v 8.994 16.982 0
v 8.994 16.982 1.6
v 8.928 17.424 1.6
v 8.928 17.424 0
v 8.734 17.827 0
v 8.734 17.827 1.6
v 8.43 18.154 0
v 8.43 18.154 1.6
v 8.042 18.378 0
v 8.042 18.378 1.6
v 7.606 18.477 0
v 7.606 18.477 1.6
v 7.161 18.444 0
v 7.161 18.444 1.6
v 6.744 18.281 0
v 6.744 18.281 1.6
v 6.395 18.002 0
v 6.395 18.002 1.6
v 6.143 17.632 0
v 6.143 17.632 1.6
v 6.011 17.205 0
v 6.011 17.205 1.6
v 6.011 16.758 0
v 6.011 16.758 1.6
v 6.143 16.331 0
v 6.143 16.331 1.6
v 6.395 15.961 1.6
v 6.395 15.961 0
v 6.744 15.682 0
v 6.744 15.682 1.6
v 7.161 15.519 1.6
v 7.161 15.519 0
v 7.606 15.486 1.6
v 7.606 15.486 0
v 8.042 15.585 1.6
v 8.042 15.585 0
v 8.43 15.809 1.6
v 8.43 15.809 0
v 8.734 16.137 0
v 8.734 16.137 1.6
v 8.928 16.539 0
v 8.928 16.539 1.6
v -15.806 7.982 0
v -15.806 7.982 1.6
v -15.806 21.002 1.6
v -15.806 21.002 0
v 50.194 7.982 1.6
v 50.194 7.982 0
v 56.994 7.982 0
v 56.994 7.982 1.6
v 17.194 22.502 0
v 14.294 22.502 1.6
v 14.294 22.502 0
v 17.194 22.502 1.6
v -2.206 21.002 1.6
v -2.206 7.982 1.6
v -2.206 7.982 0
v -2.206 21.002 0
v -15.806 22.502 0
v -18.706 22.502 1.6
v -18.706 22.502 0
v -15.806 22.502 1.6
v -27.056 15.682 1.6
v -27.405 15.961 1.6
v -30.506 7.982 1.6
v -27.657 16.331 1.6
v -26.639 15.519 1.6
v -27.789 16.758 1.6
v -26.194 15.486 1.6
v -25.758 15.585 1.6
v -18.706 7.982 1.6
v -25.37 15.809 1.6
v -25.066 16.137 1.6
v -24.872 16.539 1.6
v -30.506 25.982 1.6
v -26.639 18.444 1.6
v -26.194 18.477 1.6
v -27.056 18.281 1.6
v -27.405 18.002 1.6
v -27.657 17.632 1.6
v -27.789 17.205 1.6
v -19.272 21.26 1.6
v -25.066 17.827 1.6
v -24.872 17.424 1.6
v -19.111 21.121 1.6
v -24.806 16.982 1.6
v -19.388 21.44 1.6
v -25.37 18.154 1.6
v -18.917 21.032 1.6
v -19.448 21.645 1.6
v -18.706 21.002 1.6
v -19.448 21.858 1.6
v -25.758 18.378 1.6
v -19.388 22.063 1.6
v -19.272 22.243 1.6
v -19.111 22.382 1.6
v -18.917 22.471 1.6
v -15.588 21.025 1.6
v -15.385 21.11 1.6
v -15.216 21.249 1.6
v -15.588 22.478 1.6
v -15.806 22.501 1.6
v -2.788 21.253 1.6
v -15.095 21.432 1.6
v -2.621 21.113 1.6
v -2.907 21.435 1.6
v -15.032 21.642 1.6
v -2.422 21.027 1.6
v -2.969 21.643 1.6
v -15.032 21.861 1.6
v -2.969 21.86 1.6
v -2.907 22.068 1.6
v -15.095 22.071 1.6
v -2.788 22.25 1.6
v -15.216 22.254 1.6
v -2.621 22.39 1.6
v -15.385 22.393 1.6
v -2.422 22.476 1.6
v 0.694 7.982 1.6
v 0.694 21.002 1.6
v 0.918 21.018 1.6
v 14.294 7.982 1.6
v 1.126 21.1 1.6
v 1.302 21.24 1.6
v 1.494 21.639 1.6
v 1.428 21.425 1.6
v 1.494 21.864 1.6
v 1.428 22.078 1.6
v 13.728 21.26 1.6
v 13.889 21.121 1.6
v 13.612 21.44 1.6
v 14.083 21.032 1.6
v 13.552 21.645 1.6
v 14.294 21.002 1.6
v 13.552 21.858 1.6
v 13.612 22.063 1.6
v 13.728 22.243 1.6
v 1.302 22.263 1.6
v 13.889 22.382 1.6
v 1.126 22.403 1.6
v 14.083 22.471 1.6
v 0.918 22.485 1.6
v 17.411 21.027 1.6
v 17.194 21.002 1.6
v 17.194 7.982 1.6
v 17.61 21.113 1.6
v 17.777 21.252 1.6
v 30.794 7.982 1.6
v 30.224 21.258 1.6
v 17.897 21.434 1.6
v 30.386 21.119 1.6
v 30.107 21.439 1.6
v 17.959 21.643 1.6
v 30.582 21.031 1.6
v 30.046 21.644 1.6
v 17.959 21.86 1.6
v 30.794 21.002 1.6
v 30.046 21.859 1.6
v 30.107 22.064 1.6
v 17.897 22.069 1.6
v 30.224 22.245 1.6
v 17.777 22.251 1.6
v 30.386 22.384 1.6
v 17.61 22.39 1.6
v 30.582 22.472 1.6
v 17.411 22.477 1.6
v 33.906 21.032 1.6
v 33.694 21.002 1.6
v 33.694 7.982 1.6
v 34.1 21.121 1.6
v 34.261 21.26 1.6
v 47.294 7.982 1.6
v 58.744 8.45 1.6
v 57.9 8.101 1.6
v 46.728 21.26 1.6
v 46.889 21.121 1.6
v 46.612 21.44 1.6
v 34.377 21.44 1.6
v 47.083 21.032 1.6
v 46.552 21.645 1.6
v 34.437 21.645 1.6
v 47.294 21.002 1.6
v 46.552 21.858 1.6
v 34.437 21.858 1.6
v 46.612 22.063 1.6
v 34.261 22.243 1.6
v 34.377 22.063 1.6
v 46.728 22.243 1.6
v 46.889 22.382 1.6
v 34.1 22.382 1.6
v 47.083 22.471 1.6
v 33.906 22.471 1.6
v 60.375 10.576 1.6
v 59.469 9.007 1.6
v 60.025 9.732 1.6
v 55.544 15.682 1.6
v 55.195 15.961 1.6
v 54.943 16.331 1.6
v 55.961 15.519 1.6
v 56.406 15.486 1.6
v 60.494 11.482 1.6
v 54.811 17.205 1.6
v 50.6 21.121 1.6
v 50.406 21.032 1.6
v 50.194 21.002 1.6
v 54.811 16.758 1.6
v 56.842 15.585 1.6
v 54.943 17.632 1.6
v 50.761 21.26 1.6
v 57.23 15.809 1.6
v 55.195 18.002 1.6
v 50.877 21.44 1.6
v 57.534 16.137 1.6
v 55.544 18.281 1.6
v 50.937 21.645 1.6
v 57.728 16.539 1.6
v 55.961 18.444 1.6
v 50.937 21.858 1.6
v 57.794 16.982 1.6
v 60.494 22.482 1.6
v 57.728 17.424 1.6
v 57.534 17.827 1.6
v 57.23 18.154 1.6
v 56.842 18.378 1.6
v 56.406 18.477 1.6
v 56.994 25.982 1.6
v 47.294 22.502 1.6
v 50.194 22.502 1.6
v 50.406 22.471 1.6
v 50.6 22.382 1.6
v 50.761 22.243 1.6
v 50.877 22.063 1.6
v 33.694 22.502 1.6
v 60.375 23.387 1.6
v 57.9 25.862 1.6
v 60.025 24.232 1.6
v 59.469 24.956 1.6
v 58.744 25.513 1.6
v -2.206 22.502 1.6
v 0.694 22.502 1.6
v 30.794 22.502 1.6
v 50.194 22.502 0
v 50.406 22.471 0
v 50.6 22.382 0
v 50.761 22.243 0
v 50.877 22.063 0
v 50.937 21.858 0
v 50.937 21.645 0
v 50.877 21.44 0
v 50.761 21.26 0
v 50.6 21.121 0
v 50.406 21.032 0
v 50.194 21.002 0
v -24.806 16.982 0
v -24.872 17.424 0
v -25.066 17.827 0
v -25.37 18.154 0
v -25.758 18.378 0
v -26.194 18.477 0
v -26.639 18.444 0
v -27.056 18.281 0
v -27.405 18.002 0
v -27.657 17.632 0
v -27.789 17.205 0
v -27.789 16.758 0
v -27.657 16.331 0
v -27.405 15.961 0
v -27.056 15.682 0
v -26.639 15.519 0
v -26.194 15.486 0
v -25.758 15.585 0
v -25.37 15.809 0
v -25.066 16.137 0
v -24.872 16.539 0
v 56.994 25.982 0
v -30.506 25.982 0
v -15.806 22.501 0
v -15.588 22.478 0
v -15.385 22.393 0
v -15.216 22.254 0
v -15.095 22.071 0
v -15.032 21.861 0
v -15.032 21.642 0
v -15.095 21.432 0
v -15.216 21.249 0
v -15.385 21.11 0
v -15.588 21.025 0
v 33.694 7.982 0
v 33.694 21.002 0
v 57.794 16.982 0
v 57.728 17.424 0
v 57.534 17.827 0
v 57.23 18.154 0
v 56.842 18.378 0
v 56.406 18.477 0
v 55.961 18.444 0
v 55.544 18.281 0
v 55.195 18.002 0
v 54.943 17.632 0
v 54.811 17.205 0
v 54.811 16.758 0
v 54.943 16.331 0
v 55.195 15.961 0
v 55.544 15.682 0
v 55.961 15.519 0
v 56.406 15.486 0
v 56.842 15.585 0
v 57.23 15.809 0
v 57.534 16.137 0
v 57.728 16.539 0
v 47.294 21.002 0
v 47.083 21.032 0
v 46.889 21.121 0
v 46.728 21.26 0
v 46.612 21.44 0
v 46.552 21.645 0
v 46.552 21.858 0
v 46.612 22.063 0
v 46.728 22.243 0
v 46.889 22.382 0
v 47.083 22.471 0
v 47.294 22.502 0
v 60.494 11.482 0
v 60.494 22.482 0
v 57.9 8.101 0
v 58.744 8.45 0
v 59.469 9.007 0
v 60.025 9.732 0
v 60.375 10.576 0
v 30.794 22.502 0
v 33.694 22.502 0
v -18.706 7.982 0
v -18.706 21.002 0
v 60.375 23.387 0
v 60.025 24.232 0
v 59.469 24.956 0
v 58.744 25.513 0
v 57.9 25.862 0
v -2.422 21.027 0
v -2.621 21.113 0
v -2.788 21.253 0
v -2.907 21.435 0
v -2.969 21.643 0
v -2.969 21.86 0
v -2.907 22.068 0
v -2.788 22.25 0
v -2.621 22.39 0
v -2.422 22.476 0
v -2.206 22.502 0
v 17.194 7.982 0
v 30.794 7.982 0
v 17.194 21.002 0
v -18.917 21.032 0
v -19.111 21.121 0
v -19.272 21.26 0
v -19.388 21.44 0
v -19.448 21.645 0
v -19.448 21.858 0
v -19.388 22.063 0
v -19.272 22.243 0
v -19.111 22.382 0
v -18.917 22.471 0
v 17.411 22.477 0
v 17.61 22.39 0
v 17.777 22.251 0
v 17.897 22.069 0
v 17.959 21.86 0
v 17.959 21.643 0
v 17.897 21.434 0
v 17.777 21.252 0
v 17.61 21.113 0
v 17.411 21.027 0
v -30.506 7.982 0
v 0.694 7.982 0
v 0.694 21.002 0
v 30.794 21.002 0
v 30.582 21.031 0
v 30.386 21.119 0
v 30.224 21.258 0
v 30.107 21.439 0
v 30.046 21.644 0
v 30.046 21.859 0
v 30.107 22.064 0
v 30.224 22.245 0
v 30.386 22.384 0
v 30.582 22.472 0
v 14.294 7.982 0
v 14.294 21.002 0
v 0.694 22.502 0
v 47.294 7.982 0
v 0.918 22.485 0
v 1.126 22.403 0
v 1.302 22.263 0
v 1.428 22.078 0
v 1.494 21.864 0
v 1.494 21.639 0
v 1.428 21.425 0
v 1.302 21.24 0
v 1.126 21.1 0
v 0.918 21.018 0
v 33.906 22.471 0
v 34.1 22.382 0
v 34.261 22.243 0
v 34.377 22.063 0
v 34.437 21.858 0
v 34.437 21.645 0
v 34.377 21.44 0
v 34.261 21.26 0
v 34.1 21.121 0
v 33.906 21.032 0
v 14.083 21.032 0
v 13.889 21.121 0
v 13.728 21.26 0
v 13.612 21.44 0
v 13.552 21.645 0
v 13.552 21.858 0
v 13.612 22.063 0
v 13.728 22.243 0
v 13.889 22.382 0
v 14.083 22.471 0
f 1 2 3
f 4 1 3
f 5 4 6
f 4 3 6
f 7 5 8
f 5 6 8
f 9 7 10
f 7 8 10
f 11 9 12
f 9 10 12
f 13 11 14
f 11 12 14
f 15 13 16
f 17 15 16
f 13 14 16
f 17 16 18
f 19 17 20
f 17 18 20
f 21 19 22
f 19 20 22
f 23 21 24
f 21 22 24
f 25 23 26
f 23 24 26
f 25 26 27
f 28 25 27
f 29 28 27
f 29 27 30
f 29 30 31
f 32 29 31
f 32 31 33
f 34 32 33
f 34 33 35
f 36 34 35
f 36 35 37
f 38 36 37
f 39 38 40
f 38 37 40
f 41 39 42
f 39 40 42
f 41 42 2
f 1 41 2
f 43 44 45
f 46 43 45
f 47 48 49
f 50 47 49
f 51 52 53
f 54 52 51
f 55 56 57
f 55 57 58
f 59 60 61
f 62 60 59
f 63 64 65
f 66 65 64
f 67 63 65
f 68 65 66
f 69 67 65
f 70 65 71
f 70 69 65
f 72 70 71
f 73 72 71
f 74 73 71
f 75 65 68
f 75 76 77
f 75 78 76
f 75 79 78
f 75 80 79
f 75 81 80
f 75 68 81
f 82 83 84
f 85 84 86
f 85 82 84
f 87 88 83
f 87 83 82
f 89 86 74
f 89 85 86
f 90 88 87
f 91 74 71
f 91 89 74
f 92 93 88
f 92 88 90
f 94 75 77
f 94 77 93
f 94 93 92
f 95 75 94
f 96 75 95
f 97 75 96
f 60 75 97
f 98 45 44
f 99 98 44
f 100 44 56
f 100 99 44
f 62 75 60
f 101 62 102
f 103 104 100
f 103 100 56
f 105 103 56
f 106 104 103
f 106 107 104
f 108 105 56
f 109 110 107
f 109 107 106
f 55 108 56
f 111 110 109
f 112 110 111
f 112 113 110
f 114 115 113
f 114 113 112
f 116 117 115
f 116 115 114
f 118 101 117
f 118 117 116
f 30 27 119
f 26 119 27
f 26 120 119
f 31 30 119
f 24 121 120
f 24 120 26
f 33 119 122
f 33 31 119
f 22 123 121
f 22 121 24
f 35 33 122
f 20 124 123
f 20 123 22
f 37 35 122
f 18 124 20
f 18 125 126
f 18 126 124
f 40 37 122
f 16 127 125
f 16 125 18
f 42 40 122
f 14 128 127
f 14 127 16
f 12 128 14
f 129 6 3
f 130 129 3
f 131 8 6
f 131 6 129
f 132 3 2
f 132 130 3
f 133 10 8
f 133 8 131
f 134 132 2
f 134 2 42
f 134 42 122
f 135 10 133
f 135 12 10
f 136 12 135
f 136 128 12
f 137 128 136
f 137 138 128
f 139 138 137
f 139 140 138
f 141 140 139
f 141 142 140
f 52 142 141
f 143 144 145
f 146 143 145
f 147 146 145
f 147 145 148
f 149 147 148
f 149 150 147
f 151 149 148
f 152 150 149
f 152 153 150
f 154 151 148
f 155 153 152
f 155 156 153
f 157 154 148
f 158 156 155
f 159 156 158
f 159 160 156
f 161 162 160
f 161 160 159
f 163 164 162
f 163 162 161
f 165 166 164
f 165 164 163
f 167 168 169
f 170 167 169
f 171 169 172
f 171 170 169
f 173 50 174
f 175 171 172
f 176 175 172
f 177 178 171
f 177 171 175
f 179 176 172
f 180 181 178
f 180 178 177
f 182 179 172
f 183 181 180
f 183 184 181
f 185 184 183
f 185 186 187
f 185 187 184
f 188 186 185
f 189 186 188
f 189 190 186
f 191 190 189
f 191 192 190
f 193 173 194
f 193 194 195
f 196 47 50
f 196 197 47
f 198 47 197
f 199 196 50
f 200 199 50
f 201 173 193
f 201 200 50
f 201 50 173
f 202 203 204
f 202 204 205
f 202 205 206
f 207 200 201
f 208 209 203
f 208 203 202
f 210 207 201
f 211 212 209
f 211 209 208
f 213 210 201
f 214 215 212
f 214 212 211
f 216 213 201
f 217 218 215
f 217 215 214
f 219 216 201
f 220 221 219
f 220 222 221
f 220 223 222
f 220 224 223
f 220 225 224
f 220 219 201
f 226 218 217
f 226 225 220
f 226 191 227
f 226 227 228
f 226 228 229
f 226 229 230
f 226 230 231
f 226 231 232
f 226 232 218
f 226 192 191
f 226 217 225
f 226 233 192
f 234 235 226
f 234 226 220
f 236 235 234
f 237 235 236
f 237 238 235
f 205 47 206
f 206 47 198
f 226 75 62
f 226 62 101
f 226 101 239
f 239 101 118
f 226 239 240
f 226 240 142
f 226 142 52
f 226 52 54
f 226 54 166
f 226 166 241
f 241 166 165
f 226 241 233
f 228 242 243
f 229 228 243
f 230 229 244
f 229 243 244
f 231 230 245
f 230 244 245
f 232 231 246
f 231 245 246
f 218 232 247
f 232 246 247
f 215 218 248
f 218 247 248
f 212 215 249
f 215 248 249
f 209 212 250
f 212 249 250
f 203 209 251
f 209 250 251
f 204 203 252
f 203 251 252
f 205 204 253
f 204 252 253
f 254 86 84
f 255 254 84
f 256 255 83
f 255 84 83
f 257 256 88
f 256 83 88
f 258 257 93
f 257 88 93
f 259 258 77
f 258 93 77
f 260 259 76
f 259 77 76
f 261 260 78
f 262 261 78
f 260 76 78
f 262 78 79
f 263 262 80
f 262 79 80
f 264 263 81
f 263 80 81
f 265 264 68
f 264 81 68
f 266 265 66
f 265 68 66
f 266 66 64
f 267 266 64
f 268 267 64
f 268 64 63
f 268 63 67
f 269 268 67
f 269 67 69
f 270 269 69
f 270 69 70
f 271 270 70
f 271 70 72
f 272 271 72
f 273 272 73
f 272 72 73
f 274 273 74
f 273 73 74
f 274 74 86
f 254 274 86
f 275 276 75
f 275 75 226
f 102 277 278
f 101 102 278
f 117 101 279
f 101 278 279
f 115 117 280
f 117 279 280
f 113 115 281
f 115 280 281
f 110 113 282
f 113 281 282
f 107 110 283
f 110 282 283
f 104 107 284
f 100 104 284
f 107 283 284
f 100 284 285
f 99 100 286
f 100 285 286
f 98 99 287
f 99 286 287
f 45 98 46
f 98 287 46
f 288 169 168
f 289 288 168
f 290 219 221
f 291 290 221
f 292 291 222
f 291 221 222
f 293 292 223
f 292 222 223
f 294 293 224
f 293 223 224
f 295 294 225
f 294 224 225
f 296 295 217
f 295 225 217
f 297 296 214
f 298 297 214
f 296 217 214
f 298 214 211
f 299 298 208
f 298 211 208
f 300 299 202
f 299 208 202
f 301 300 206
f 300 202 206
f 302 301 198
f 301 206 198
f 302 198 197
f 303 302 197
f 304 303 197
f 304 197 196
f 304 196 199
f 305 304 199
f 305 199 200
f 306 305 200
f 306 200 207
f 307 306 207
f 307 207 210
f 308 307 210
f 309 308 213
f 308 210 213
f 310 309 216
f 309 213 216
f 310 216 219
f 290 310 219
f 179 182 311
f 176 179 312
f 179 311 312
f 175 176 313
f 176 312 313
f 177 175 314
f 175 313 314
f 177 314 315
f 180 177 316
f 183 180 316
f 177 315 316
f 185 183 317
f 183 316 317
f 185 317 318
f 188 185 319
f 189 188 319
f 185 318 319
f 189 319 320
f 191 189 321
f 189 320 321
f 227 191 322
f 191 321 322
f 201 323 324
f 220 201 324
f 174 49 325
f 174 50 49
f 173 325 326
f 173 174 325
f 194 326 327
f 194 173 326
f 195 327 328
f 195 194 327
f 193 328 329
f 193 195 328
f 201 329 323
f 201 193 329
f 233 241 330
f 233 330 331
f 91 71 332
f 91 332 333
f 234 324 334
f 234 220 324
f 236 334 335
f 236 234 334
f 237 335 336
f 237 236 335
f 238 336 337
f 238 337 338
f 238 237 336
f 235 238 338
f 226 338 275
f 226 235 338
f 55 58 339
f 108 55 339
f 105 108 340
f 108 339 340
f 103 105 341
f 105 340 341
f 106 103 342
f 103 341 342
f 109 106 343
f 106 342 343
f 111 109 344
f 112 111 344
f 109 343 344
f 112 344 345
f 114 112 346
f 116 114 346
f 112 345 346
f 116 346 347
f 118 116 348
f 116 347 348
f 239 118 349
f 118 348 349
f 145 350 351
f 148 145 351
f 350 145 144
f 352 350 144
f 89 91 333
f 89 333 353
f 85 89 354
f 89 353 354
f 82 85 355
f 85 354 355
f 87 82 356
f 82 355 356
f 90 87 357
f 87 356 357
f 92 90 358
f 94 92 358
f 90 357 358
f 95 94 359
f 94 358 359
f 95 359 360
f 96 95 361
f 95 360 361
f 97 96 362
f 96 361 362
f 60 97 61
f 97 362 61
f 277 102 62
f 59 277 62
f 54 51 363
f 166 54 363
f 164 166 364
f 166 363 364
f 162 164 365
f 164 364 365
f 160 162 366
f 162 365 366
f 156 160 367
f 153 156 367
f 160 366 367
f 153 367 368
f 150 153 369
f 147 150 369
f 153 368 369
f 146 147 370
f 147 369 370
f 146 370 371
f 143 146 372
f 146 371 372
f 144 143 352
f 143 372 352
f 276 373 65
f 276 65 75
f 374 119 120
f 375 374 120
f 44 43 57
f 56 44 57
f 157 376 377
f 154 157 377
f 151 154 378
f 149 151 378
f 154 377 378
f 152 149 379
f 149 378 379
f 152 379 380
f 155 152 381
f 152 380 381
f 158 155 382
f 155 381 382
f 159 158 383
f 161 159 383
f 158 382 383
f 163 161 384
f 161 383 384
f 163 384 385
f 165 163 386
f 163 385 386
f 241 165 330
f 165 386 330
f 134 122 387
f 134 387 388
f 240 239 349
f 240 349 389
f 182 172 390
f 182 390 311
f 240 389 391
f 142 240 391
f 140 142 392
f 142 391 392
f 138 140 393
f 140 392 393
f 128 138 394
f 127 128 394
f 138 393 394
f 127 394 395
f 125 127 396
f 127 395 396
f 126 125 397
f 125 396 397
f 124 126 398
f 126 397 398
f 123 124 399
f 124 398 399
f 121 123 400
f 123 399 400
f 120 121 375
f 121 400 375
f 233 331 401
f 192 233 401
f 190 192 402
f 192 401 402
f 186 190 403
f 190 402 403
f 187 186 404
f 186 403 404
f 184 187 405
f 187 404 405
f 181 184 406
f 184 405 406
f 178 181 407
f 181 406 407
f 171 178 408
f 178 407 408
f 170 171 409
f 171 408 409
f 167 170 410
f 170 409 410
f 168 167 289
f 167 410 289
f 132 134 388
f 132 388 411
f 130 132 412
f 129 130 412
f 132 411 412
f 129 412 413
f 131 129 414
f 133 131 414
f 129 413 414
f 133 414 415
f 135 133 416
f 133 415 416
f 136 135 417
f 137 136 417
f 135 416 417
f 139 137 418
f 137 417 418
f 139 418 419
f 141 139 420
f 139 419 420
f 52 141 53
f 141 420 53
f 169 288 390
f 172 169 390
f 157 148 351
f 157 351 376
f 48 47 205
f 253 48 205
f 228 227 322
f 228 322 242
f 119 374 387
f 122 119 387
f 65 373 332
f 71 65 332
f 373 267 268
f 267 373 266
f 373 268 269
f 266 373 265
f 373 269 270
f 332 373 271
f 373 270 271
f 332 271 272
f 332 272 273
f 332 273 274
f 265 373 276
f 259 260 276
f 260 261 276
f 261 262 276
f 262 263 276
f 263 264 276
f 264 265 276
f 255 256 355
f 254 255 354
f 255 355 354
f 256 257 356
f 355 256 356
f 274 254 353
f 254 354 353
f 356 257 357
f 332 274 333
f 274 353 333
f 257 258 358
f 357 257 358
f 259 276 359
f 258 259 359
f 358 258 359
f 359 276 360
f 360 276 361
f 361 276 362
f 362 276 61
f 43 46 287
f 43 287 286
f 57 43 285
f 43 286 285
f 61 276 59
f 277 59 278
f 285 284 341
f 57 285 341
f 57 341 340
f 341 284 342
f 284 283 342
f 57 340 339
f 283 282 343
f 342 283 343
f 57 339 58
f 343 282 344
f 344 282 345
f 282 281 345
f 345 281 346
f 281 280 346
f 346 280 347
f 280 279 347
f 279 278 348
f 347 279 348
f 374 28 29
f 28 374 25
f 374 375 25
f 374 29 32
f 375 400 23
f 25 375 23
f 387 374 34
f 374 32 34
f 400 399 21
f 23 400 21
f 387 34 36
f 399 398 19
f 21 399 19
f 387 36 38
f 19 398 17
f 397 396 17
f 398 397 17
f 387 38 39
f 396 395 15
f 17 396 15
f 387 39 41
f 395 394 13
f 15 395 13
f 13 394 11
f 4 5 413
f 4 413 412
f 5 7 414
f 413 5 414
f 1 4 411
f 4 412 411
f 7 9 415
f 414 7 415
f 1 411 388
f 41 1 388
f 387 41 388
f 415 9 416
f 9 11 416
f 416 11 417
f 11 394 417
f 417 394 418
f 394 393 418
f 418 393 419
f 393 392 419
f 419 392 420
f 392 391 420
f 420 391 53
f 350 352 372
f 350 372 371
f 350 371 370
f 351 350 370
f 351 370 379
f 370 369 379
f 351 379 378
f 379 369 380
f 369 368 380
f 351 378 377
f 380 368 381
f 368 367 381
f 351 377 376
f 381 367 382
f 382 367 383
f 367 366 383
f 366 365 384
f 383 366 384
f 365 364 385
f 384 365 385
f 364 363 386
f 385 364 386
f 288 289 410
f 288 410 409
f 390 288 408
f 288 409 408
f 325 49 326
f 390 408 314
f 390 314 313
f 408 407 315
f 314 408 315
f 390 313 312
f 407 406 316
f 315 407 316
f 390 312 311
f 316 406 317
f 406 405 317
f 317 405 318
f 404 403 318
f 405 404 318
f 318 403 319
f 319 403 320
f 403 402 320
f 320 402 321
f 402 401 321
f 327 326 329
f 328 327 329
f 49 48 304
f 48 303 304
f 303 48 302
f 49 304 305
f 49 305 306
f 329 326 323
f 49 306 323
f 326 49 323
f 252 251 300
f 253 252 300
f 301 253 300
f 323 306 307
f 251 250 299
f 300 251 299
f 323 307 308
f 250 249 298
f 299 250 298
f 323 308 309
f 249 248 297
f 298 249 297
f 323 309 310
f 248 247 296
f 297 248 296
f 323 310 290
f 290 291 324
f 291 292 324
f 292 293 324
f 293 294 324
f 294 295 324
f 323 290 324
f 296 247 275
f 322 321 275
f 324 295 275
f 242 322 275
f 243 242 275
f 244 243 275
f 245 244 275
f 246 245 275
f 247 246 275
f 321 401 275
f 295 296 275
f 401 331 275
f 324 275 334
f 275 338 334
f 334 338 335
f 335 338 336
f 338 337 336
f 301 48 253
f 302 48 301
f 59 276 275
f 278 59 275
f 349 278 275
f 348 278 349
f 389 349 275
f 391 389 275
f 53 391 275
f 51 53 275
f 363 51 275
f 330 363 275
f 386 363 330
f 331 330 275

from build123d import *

# Parameters (mm, degrees)
SZKIC1_W                    = 91
SZKIC1_H                    = 18
DODANIE_WYCI_GNI_CIE1_DEPTH = 1.6
ZAOKR_GLENIE2_R             = 3.5
SZKIC5_W                    = 2.9
SZKIC5_H                    = 14.52
WYTNIJ_WYCI_GNI_CIE2_DEPTH  = 1.6
SZKIC7_R                    = 1.5
WYTNIJ_WYCI_GNI_CIE3_DEPTH  = 1.6
SZKIC10_R                   = 1.5
WYTNIJ_WYCI_GNI_CIE4_DEPTH  = 1.6
SZKIC11_R                   = 0.75
SZKIC11_R_2                 = 0.750301754
SZKIC11_R_3                 = 0.752070273
SZKIC11_R_4                 = 0.7503443
SZKIC11_R_5                 = 0.750020646
WYTNIJ_WYCI_GNI_CIE5_DEPTH  = 1.6


with BuildPart() as part:
    # Szkic1 → Dodanie-wyciągnięcie1 (new body)
    with BuildSketch(Plane.XY):
        with Locations((14.994318182, 16.981534091)):
            Rectangle(SZKIC1_W, SZKIC1_H)
    extrude(amount=DODANIE_WYCI_GNI_CIE1_DEPTH)

    # Zaokrąglenie2
    zaokr_glenie2_edges = [part.edges().sort_by_distance(p)[0] for p in [
        (60.494318182, 25.981534091, 0.8),
        (60.494318182, 7.981534091, 0.8),
    ]]
    fillet(zaokr_glenie2_edges, radius=ZAOKR_GLENIE2_R)

    # Szkic5 → Wytnij-wyciągnięcie2 (cut)
    with BuildSketch(Plane.XY.offset(1.6)):
        with Locations((-17.255681818, 15.241534091)):
            Rectangle(SZKIC5_W, SZKIC5_H)
        with Locations((-0.755681818, 15.241534091)):
            Rectangle(SZKIC5_W, SZKIC5_H)
        with Locations((15.744318182, 15.241534091)):
            Rectangle(SZKIC5_W, SZKIC5_H)
        with Locations((32.244318182, 15.241534091)):
            Rectangle(SZKIC5_W, SZKIC5_H)
        with Locations((48.744318182, 15.241534091)):
            Rectangle(SZKIC5_W, SZKIC5_H)
    extrude(amount=-WYTNIJ_WYCI_GNI_CIE2_DEPTH, mode=Mode.SUBTRACT)

    # Szkic7 → Wytnij-wyciągnięcie3 (cut)
    with BuildSketch(Plane.XY.offset(1.6)):
        with Locations((-26.305681818, 16.981534091)):
            Circle(SZKIC7_R)
        with Locations((56.294318182, 16.981534091)):
            Circle(SZKIC7_R)
    extrude(amount=-WYTNIJ_WYCI_GNI_CIE3_DEPTH, mode=Mode.SUBTRACT)

    # Szkic10 → Wytnij-wyciągnięcie4 (cut)
    with BuildSketch(Plane.XY.offset(1.6)):
        with Locations((7.494318182, 16.981534091)):
            Circle(SZKIC10_R)
    extrude(amount=-WYTNIJ_WYCI_GNI_CIE4_DEPTH, mode=Mode.SUBTRACT)

    # Szkic11 → Wytnij-wyciągnięcie5 (cut)
    with BuildSketch(Plane(origin=(0, 0, 0), x_dir=(-1, 0, 0), z_dir=(0, 0, -1))):
        with Locations((18.705681818, 21.751534091)):
            Circle(SZKIC11_R)
        with Locations((15.773526009, 21.751534091)):
            Circle(SZKIC11_R)
        with Locations((2.226959067, 21.751534091)):
            Circle(SZKIC11_R_2)
        with Locations((-0.75008283, 21.751534091)):
            Circle(SZKIC11_R_3)
        with Locations((-14.294318182, 21.751534091)):
            Circle(SZKIC11_R)
        with Locations((-17.217046338, 21.751534091)):
            Circle(SZKIC11_R_4)
        with Locations((-30.788753193, 21.751534091)):
            Circle(SZKIC11_R_5)
        with Locations((-33.694318182, 21.751534091)):
            Circle(SZKIC11_R)
        with Locations((-47.294318182, 21.751534091)):
            Circle(SZKIC11_R)
        with Locations((-50.194318182, 21.751534091)):
            Circle(SZKIC11_R)
    extrude(amount=-WYTNIJ_WYCI_GNI_CIE5_DEPTH, mode=Mode.SUBTRACT)


solid = part.part
